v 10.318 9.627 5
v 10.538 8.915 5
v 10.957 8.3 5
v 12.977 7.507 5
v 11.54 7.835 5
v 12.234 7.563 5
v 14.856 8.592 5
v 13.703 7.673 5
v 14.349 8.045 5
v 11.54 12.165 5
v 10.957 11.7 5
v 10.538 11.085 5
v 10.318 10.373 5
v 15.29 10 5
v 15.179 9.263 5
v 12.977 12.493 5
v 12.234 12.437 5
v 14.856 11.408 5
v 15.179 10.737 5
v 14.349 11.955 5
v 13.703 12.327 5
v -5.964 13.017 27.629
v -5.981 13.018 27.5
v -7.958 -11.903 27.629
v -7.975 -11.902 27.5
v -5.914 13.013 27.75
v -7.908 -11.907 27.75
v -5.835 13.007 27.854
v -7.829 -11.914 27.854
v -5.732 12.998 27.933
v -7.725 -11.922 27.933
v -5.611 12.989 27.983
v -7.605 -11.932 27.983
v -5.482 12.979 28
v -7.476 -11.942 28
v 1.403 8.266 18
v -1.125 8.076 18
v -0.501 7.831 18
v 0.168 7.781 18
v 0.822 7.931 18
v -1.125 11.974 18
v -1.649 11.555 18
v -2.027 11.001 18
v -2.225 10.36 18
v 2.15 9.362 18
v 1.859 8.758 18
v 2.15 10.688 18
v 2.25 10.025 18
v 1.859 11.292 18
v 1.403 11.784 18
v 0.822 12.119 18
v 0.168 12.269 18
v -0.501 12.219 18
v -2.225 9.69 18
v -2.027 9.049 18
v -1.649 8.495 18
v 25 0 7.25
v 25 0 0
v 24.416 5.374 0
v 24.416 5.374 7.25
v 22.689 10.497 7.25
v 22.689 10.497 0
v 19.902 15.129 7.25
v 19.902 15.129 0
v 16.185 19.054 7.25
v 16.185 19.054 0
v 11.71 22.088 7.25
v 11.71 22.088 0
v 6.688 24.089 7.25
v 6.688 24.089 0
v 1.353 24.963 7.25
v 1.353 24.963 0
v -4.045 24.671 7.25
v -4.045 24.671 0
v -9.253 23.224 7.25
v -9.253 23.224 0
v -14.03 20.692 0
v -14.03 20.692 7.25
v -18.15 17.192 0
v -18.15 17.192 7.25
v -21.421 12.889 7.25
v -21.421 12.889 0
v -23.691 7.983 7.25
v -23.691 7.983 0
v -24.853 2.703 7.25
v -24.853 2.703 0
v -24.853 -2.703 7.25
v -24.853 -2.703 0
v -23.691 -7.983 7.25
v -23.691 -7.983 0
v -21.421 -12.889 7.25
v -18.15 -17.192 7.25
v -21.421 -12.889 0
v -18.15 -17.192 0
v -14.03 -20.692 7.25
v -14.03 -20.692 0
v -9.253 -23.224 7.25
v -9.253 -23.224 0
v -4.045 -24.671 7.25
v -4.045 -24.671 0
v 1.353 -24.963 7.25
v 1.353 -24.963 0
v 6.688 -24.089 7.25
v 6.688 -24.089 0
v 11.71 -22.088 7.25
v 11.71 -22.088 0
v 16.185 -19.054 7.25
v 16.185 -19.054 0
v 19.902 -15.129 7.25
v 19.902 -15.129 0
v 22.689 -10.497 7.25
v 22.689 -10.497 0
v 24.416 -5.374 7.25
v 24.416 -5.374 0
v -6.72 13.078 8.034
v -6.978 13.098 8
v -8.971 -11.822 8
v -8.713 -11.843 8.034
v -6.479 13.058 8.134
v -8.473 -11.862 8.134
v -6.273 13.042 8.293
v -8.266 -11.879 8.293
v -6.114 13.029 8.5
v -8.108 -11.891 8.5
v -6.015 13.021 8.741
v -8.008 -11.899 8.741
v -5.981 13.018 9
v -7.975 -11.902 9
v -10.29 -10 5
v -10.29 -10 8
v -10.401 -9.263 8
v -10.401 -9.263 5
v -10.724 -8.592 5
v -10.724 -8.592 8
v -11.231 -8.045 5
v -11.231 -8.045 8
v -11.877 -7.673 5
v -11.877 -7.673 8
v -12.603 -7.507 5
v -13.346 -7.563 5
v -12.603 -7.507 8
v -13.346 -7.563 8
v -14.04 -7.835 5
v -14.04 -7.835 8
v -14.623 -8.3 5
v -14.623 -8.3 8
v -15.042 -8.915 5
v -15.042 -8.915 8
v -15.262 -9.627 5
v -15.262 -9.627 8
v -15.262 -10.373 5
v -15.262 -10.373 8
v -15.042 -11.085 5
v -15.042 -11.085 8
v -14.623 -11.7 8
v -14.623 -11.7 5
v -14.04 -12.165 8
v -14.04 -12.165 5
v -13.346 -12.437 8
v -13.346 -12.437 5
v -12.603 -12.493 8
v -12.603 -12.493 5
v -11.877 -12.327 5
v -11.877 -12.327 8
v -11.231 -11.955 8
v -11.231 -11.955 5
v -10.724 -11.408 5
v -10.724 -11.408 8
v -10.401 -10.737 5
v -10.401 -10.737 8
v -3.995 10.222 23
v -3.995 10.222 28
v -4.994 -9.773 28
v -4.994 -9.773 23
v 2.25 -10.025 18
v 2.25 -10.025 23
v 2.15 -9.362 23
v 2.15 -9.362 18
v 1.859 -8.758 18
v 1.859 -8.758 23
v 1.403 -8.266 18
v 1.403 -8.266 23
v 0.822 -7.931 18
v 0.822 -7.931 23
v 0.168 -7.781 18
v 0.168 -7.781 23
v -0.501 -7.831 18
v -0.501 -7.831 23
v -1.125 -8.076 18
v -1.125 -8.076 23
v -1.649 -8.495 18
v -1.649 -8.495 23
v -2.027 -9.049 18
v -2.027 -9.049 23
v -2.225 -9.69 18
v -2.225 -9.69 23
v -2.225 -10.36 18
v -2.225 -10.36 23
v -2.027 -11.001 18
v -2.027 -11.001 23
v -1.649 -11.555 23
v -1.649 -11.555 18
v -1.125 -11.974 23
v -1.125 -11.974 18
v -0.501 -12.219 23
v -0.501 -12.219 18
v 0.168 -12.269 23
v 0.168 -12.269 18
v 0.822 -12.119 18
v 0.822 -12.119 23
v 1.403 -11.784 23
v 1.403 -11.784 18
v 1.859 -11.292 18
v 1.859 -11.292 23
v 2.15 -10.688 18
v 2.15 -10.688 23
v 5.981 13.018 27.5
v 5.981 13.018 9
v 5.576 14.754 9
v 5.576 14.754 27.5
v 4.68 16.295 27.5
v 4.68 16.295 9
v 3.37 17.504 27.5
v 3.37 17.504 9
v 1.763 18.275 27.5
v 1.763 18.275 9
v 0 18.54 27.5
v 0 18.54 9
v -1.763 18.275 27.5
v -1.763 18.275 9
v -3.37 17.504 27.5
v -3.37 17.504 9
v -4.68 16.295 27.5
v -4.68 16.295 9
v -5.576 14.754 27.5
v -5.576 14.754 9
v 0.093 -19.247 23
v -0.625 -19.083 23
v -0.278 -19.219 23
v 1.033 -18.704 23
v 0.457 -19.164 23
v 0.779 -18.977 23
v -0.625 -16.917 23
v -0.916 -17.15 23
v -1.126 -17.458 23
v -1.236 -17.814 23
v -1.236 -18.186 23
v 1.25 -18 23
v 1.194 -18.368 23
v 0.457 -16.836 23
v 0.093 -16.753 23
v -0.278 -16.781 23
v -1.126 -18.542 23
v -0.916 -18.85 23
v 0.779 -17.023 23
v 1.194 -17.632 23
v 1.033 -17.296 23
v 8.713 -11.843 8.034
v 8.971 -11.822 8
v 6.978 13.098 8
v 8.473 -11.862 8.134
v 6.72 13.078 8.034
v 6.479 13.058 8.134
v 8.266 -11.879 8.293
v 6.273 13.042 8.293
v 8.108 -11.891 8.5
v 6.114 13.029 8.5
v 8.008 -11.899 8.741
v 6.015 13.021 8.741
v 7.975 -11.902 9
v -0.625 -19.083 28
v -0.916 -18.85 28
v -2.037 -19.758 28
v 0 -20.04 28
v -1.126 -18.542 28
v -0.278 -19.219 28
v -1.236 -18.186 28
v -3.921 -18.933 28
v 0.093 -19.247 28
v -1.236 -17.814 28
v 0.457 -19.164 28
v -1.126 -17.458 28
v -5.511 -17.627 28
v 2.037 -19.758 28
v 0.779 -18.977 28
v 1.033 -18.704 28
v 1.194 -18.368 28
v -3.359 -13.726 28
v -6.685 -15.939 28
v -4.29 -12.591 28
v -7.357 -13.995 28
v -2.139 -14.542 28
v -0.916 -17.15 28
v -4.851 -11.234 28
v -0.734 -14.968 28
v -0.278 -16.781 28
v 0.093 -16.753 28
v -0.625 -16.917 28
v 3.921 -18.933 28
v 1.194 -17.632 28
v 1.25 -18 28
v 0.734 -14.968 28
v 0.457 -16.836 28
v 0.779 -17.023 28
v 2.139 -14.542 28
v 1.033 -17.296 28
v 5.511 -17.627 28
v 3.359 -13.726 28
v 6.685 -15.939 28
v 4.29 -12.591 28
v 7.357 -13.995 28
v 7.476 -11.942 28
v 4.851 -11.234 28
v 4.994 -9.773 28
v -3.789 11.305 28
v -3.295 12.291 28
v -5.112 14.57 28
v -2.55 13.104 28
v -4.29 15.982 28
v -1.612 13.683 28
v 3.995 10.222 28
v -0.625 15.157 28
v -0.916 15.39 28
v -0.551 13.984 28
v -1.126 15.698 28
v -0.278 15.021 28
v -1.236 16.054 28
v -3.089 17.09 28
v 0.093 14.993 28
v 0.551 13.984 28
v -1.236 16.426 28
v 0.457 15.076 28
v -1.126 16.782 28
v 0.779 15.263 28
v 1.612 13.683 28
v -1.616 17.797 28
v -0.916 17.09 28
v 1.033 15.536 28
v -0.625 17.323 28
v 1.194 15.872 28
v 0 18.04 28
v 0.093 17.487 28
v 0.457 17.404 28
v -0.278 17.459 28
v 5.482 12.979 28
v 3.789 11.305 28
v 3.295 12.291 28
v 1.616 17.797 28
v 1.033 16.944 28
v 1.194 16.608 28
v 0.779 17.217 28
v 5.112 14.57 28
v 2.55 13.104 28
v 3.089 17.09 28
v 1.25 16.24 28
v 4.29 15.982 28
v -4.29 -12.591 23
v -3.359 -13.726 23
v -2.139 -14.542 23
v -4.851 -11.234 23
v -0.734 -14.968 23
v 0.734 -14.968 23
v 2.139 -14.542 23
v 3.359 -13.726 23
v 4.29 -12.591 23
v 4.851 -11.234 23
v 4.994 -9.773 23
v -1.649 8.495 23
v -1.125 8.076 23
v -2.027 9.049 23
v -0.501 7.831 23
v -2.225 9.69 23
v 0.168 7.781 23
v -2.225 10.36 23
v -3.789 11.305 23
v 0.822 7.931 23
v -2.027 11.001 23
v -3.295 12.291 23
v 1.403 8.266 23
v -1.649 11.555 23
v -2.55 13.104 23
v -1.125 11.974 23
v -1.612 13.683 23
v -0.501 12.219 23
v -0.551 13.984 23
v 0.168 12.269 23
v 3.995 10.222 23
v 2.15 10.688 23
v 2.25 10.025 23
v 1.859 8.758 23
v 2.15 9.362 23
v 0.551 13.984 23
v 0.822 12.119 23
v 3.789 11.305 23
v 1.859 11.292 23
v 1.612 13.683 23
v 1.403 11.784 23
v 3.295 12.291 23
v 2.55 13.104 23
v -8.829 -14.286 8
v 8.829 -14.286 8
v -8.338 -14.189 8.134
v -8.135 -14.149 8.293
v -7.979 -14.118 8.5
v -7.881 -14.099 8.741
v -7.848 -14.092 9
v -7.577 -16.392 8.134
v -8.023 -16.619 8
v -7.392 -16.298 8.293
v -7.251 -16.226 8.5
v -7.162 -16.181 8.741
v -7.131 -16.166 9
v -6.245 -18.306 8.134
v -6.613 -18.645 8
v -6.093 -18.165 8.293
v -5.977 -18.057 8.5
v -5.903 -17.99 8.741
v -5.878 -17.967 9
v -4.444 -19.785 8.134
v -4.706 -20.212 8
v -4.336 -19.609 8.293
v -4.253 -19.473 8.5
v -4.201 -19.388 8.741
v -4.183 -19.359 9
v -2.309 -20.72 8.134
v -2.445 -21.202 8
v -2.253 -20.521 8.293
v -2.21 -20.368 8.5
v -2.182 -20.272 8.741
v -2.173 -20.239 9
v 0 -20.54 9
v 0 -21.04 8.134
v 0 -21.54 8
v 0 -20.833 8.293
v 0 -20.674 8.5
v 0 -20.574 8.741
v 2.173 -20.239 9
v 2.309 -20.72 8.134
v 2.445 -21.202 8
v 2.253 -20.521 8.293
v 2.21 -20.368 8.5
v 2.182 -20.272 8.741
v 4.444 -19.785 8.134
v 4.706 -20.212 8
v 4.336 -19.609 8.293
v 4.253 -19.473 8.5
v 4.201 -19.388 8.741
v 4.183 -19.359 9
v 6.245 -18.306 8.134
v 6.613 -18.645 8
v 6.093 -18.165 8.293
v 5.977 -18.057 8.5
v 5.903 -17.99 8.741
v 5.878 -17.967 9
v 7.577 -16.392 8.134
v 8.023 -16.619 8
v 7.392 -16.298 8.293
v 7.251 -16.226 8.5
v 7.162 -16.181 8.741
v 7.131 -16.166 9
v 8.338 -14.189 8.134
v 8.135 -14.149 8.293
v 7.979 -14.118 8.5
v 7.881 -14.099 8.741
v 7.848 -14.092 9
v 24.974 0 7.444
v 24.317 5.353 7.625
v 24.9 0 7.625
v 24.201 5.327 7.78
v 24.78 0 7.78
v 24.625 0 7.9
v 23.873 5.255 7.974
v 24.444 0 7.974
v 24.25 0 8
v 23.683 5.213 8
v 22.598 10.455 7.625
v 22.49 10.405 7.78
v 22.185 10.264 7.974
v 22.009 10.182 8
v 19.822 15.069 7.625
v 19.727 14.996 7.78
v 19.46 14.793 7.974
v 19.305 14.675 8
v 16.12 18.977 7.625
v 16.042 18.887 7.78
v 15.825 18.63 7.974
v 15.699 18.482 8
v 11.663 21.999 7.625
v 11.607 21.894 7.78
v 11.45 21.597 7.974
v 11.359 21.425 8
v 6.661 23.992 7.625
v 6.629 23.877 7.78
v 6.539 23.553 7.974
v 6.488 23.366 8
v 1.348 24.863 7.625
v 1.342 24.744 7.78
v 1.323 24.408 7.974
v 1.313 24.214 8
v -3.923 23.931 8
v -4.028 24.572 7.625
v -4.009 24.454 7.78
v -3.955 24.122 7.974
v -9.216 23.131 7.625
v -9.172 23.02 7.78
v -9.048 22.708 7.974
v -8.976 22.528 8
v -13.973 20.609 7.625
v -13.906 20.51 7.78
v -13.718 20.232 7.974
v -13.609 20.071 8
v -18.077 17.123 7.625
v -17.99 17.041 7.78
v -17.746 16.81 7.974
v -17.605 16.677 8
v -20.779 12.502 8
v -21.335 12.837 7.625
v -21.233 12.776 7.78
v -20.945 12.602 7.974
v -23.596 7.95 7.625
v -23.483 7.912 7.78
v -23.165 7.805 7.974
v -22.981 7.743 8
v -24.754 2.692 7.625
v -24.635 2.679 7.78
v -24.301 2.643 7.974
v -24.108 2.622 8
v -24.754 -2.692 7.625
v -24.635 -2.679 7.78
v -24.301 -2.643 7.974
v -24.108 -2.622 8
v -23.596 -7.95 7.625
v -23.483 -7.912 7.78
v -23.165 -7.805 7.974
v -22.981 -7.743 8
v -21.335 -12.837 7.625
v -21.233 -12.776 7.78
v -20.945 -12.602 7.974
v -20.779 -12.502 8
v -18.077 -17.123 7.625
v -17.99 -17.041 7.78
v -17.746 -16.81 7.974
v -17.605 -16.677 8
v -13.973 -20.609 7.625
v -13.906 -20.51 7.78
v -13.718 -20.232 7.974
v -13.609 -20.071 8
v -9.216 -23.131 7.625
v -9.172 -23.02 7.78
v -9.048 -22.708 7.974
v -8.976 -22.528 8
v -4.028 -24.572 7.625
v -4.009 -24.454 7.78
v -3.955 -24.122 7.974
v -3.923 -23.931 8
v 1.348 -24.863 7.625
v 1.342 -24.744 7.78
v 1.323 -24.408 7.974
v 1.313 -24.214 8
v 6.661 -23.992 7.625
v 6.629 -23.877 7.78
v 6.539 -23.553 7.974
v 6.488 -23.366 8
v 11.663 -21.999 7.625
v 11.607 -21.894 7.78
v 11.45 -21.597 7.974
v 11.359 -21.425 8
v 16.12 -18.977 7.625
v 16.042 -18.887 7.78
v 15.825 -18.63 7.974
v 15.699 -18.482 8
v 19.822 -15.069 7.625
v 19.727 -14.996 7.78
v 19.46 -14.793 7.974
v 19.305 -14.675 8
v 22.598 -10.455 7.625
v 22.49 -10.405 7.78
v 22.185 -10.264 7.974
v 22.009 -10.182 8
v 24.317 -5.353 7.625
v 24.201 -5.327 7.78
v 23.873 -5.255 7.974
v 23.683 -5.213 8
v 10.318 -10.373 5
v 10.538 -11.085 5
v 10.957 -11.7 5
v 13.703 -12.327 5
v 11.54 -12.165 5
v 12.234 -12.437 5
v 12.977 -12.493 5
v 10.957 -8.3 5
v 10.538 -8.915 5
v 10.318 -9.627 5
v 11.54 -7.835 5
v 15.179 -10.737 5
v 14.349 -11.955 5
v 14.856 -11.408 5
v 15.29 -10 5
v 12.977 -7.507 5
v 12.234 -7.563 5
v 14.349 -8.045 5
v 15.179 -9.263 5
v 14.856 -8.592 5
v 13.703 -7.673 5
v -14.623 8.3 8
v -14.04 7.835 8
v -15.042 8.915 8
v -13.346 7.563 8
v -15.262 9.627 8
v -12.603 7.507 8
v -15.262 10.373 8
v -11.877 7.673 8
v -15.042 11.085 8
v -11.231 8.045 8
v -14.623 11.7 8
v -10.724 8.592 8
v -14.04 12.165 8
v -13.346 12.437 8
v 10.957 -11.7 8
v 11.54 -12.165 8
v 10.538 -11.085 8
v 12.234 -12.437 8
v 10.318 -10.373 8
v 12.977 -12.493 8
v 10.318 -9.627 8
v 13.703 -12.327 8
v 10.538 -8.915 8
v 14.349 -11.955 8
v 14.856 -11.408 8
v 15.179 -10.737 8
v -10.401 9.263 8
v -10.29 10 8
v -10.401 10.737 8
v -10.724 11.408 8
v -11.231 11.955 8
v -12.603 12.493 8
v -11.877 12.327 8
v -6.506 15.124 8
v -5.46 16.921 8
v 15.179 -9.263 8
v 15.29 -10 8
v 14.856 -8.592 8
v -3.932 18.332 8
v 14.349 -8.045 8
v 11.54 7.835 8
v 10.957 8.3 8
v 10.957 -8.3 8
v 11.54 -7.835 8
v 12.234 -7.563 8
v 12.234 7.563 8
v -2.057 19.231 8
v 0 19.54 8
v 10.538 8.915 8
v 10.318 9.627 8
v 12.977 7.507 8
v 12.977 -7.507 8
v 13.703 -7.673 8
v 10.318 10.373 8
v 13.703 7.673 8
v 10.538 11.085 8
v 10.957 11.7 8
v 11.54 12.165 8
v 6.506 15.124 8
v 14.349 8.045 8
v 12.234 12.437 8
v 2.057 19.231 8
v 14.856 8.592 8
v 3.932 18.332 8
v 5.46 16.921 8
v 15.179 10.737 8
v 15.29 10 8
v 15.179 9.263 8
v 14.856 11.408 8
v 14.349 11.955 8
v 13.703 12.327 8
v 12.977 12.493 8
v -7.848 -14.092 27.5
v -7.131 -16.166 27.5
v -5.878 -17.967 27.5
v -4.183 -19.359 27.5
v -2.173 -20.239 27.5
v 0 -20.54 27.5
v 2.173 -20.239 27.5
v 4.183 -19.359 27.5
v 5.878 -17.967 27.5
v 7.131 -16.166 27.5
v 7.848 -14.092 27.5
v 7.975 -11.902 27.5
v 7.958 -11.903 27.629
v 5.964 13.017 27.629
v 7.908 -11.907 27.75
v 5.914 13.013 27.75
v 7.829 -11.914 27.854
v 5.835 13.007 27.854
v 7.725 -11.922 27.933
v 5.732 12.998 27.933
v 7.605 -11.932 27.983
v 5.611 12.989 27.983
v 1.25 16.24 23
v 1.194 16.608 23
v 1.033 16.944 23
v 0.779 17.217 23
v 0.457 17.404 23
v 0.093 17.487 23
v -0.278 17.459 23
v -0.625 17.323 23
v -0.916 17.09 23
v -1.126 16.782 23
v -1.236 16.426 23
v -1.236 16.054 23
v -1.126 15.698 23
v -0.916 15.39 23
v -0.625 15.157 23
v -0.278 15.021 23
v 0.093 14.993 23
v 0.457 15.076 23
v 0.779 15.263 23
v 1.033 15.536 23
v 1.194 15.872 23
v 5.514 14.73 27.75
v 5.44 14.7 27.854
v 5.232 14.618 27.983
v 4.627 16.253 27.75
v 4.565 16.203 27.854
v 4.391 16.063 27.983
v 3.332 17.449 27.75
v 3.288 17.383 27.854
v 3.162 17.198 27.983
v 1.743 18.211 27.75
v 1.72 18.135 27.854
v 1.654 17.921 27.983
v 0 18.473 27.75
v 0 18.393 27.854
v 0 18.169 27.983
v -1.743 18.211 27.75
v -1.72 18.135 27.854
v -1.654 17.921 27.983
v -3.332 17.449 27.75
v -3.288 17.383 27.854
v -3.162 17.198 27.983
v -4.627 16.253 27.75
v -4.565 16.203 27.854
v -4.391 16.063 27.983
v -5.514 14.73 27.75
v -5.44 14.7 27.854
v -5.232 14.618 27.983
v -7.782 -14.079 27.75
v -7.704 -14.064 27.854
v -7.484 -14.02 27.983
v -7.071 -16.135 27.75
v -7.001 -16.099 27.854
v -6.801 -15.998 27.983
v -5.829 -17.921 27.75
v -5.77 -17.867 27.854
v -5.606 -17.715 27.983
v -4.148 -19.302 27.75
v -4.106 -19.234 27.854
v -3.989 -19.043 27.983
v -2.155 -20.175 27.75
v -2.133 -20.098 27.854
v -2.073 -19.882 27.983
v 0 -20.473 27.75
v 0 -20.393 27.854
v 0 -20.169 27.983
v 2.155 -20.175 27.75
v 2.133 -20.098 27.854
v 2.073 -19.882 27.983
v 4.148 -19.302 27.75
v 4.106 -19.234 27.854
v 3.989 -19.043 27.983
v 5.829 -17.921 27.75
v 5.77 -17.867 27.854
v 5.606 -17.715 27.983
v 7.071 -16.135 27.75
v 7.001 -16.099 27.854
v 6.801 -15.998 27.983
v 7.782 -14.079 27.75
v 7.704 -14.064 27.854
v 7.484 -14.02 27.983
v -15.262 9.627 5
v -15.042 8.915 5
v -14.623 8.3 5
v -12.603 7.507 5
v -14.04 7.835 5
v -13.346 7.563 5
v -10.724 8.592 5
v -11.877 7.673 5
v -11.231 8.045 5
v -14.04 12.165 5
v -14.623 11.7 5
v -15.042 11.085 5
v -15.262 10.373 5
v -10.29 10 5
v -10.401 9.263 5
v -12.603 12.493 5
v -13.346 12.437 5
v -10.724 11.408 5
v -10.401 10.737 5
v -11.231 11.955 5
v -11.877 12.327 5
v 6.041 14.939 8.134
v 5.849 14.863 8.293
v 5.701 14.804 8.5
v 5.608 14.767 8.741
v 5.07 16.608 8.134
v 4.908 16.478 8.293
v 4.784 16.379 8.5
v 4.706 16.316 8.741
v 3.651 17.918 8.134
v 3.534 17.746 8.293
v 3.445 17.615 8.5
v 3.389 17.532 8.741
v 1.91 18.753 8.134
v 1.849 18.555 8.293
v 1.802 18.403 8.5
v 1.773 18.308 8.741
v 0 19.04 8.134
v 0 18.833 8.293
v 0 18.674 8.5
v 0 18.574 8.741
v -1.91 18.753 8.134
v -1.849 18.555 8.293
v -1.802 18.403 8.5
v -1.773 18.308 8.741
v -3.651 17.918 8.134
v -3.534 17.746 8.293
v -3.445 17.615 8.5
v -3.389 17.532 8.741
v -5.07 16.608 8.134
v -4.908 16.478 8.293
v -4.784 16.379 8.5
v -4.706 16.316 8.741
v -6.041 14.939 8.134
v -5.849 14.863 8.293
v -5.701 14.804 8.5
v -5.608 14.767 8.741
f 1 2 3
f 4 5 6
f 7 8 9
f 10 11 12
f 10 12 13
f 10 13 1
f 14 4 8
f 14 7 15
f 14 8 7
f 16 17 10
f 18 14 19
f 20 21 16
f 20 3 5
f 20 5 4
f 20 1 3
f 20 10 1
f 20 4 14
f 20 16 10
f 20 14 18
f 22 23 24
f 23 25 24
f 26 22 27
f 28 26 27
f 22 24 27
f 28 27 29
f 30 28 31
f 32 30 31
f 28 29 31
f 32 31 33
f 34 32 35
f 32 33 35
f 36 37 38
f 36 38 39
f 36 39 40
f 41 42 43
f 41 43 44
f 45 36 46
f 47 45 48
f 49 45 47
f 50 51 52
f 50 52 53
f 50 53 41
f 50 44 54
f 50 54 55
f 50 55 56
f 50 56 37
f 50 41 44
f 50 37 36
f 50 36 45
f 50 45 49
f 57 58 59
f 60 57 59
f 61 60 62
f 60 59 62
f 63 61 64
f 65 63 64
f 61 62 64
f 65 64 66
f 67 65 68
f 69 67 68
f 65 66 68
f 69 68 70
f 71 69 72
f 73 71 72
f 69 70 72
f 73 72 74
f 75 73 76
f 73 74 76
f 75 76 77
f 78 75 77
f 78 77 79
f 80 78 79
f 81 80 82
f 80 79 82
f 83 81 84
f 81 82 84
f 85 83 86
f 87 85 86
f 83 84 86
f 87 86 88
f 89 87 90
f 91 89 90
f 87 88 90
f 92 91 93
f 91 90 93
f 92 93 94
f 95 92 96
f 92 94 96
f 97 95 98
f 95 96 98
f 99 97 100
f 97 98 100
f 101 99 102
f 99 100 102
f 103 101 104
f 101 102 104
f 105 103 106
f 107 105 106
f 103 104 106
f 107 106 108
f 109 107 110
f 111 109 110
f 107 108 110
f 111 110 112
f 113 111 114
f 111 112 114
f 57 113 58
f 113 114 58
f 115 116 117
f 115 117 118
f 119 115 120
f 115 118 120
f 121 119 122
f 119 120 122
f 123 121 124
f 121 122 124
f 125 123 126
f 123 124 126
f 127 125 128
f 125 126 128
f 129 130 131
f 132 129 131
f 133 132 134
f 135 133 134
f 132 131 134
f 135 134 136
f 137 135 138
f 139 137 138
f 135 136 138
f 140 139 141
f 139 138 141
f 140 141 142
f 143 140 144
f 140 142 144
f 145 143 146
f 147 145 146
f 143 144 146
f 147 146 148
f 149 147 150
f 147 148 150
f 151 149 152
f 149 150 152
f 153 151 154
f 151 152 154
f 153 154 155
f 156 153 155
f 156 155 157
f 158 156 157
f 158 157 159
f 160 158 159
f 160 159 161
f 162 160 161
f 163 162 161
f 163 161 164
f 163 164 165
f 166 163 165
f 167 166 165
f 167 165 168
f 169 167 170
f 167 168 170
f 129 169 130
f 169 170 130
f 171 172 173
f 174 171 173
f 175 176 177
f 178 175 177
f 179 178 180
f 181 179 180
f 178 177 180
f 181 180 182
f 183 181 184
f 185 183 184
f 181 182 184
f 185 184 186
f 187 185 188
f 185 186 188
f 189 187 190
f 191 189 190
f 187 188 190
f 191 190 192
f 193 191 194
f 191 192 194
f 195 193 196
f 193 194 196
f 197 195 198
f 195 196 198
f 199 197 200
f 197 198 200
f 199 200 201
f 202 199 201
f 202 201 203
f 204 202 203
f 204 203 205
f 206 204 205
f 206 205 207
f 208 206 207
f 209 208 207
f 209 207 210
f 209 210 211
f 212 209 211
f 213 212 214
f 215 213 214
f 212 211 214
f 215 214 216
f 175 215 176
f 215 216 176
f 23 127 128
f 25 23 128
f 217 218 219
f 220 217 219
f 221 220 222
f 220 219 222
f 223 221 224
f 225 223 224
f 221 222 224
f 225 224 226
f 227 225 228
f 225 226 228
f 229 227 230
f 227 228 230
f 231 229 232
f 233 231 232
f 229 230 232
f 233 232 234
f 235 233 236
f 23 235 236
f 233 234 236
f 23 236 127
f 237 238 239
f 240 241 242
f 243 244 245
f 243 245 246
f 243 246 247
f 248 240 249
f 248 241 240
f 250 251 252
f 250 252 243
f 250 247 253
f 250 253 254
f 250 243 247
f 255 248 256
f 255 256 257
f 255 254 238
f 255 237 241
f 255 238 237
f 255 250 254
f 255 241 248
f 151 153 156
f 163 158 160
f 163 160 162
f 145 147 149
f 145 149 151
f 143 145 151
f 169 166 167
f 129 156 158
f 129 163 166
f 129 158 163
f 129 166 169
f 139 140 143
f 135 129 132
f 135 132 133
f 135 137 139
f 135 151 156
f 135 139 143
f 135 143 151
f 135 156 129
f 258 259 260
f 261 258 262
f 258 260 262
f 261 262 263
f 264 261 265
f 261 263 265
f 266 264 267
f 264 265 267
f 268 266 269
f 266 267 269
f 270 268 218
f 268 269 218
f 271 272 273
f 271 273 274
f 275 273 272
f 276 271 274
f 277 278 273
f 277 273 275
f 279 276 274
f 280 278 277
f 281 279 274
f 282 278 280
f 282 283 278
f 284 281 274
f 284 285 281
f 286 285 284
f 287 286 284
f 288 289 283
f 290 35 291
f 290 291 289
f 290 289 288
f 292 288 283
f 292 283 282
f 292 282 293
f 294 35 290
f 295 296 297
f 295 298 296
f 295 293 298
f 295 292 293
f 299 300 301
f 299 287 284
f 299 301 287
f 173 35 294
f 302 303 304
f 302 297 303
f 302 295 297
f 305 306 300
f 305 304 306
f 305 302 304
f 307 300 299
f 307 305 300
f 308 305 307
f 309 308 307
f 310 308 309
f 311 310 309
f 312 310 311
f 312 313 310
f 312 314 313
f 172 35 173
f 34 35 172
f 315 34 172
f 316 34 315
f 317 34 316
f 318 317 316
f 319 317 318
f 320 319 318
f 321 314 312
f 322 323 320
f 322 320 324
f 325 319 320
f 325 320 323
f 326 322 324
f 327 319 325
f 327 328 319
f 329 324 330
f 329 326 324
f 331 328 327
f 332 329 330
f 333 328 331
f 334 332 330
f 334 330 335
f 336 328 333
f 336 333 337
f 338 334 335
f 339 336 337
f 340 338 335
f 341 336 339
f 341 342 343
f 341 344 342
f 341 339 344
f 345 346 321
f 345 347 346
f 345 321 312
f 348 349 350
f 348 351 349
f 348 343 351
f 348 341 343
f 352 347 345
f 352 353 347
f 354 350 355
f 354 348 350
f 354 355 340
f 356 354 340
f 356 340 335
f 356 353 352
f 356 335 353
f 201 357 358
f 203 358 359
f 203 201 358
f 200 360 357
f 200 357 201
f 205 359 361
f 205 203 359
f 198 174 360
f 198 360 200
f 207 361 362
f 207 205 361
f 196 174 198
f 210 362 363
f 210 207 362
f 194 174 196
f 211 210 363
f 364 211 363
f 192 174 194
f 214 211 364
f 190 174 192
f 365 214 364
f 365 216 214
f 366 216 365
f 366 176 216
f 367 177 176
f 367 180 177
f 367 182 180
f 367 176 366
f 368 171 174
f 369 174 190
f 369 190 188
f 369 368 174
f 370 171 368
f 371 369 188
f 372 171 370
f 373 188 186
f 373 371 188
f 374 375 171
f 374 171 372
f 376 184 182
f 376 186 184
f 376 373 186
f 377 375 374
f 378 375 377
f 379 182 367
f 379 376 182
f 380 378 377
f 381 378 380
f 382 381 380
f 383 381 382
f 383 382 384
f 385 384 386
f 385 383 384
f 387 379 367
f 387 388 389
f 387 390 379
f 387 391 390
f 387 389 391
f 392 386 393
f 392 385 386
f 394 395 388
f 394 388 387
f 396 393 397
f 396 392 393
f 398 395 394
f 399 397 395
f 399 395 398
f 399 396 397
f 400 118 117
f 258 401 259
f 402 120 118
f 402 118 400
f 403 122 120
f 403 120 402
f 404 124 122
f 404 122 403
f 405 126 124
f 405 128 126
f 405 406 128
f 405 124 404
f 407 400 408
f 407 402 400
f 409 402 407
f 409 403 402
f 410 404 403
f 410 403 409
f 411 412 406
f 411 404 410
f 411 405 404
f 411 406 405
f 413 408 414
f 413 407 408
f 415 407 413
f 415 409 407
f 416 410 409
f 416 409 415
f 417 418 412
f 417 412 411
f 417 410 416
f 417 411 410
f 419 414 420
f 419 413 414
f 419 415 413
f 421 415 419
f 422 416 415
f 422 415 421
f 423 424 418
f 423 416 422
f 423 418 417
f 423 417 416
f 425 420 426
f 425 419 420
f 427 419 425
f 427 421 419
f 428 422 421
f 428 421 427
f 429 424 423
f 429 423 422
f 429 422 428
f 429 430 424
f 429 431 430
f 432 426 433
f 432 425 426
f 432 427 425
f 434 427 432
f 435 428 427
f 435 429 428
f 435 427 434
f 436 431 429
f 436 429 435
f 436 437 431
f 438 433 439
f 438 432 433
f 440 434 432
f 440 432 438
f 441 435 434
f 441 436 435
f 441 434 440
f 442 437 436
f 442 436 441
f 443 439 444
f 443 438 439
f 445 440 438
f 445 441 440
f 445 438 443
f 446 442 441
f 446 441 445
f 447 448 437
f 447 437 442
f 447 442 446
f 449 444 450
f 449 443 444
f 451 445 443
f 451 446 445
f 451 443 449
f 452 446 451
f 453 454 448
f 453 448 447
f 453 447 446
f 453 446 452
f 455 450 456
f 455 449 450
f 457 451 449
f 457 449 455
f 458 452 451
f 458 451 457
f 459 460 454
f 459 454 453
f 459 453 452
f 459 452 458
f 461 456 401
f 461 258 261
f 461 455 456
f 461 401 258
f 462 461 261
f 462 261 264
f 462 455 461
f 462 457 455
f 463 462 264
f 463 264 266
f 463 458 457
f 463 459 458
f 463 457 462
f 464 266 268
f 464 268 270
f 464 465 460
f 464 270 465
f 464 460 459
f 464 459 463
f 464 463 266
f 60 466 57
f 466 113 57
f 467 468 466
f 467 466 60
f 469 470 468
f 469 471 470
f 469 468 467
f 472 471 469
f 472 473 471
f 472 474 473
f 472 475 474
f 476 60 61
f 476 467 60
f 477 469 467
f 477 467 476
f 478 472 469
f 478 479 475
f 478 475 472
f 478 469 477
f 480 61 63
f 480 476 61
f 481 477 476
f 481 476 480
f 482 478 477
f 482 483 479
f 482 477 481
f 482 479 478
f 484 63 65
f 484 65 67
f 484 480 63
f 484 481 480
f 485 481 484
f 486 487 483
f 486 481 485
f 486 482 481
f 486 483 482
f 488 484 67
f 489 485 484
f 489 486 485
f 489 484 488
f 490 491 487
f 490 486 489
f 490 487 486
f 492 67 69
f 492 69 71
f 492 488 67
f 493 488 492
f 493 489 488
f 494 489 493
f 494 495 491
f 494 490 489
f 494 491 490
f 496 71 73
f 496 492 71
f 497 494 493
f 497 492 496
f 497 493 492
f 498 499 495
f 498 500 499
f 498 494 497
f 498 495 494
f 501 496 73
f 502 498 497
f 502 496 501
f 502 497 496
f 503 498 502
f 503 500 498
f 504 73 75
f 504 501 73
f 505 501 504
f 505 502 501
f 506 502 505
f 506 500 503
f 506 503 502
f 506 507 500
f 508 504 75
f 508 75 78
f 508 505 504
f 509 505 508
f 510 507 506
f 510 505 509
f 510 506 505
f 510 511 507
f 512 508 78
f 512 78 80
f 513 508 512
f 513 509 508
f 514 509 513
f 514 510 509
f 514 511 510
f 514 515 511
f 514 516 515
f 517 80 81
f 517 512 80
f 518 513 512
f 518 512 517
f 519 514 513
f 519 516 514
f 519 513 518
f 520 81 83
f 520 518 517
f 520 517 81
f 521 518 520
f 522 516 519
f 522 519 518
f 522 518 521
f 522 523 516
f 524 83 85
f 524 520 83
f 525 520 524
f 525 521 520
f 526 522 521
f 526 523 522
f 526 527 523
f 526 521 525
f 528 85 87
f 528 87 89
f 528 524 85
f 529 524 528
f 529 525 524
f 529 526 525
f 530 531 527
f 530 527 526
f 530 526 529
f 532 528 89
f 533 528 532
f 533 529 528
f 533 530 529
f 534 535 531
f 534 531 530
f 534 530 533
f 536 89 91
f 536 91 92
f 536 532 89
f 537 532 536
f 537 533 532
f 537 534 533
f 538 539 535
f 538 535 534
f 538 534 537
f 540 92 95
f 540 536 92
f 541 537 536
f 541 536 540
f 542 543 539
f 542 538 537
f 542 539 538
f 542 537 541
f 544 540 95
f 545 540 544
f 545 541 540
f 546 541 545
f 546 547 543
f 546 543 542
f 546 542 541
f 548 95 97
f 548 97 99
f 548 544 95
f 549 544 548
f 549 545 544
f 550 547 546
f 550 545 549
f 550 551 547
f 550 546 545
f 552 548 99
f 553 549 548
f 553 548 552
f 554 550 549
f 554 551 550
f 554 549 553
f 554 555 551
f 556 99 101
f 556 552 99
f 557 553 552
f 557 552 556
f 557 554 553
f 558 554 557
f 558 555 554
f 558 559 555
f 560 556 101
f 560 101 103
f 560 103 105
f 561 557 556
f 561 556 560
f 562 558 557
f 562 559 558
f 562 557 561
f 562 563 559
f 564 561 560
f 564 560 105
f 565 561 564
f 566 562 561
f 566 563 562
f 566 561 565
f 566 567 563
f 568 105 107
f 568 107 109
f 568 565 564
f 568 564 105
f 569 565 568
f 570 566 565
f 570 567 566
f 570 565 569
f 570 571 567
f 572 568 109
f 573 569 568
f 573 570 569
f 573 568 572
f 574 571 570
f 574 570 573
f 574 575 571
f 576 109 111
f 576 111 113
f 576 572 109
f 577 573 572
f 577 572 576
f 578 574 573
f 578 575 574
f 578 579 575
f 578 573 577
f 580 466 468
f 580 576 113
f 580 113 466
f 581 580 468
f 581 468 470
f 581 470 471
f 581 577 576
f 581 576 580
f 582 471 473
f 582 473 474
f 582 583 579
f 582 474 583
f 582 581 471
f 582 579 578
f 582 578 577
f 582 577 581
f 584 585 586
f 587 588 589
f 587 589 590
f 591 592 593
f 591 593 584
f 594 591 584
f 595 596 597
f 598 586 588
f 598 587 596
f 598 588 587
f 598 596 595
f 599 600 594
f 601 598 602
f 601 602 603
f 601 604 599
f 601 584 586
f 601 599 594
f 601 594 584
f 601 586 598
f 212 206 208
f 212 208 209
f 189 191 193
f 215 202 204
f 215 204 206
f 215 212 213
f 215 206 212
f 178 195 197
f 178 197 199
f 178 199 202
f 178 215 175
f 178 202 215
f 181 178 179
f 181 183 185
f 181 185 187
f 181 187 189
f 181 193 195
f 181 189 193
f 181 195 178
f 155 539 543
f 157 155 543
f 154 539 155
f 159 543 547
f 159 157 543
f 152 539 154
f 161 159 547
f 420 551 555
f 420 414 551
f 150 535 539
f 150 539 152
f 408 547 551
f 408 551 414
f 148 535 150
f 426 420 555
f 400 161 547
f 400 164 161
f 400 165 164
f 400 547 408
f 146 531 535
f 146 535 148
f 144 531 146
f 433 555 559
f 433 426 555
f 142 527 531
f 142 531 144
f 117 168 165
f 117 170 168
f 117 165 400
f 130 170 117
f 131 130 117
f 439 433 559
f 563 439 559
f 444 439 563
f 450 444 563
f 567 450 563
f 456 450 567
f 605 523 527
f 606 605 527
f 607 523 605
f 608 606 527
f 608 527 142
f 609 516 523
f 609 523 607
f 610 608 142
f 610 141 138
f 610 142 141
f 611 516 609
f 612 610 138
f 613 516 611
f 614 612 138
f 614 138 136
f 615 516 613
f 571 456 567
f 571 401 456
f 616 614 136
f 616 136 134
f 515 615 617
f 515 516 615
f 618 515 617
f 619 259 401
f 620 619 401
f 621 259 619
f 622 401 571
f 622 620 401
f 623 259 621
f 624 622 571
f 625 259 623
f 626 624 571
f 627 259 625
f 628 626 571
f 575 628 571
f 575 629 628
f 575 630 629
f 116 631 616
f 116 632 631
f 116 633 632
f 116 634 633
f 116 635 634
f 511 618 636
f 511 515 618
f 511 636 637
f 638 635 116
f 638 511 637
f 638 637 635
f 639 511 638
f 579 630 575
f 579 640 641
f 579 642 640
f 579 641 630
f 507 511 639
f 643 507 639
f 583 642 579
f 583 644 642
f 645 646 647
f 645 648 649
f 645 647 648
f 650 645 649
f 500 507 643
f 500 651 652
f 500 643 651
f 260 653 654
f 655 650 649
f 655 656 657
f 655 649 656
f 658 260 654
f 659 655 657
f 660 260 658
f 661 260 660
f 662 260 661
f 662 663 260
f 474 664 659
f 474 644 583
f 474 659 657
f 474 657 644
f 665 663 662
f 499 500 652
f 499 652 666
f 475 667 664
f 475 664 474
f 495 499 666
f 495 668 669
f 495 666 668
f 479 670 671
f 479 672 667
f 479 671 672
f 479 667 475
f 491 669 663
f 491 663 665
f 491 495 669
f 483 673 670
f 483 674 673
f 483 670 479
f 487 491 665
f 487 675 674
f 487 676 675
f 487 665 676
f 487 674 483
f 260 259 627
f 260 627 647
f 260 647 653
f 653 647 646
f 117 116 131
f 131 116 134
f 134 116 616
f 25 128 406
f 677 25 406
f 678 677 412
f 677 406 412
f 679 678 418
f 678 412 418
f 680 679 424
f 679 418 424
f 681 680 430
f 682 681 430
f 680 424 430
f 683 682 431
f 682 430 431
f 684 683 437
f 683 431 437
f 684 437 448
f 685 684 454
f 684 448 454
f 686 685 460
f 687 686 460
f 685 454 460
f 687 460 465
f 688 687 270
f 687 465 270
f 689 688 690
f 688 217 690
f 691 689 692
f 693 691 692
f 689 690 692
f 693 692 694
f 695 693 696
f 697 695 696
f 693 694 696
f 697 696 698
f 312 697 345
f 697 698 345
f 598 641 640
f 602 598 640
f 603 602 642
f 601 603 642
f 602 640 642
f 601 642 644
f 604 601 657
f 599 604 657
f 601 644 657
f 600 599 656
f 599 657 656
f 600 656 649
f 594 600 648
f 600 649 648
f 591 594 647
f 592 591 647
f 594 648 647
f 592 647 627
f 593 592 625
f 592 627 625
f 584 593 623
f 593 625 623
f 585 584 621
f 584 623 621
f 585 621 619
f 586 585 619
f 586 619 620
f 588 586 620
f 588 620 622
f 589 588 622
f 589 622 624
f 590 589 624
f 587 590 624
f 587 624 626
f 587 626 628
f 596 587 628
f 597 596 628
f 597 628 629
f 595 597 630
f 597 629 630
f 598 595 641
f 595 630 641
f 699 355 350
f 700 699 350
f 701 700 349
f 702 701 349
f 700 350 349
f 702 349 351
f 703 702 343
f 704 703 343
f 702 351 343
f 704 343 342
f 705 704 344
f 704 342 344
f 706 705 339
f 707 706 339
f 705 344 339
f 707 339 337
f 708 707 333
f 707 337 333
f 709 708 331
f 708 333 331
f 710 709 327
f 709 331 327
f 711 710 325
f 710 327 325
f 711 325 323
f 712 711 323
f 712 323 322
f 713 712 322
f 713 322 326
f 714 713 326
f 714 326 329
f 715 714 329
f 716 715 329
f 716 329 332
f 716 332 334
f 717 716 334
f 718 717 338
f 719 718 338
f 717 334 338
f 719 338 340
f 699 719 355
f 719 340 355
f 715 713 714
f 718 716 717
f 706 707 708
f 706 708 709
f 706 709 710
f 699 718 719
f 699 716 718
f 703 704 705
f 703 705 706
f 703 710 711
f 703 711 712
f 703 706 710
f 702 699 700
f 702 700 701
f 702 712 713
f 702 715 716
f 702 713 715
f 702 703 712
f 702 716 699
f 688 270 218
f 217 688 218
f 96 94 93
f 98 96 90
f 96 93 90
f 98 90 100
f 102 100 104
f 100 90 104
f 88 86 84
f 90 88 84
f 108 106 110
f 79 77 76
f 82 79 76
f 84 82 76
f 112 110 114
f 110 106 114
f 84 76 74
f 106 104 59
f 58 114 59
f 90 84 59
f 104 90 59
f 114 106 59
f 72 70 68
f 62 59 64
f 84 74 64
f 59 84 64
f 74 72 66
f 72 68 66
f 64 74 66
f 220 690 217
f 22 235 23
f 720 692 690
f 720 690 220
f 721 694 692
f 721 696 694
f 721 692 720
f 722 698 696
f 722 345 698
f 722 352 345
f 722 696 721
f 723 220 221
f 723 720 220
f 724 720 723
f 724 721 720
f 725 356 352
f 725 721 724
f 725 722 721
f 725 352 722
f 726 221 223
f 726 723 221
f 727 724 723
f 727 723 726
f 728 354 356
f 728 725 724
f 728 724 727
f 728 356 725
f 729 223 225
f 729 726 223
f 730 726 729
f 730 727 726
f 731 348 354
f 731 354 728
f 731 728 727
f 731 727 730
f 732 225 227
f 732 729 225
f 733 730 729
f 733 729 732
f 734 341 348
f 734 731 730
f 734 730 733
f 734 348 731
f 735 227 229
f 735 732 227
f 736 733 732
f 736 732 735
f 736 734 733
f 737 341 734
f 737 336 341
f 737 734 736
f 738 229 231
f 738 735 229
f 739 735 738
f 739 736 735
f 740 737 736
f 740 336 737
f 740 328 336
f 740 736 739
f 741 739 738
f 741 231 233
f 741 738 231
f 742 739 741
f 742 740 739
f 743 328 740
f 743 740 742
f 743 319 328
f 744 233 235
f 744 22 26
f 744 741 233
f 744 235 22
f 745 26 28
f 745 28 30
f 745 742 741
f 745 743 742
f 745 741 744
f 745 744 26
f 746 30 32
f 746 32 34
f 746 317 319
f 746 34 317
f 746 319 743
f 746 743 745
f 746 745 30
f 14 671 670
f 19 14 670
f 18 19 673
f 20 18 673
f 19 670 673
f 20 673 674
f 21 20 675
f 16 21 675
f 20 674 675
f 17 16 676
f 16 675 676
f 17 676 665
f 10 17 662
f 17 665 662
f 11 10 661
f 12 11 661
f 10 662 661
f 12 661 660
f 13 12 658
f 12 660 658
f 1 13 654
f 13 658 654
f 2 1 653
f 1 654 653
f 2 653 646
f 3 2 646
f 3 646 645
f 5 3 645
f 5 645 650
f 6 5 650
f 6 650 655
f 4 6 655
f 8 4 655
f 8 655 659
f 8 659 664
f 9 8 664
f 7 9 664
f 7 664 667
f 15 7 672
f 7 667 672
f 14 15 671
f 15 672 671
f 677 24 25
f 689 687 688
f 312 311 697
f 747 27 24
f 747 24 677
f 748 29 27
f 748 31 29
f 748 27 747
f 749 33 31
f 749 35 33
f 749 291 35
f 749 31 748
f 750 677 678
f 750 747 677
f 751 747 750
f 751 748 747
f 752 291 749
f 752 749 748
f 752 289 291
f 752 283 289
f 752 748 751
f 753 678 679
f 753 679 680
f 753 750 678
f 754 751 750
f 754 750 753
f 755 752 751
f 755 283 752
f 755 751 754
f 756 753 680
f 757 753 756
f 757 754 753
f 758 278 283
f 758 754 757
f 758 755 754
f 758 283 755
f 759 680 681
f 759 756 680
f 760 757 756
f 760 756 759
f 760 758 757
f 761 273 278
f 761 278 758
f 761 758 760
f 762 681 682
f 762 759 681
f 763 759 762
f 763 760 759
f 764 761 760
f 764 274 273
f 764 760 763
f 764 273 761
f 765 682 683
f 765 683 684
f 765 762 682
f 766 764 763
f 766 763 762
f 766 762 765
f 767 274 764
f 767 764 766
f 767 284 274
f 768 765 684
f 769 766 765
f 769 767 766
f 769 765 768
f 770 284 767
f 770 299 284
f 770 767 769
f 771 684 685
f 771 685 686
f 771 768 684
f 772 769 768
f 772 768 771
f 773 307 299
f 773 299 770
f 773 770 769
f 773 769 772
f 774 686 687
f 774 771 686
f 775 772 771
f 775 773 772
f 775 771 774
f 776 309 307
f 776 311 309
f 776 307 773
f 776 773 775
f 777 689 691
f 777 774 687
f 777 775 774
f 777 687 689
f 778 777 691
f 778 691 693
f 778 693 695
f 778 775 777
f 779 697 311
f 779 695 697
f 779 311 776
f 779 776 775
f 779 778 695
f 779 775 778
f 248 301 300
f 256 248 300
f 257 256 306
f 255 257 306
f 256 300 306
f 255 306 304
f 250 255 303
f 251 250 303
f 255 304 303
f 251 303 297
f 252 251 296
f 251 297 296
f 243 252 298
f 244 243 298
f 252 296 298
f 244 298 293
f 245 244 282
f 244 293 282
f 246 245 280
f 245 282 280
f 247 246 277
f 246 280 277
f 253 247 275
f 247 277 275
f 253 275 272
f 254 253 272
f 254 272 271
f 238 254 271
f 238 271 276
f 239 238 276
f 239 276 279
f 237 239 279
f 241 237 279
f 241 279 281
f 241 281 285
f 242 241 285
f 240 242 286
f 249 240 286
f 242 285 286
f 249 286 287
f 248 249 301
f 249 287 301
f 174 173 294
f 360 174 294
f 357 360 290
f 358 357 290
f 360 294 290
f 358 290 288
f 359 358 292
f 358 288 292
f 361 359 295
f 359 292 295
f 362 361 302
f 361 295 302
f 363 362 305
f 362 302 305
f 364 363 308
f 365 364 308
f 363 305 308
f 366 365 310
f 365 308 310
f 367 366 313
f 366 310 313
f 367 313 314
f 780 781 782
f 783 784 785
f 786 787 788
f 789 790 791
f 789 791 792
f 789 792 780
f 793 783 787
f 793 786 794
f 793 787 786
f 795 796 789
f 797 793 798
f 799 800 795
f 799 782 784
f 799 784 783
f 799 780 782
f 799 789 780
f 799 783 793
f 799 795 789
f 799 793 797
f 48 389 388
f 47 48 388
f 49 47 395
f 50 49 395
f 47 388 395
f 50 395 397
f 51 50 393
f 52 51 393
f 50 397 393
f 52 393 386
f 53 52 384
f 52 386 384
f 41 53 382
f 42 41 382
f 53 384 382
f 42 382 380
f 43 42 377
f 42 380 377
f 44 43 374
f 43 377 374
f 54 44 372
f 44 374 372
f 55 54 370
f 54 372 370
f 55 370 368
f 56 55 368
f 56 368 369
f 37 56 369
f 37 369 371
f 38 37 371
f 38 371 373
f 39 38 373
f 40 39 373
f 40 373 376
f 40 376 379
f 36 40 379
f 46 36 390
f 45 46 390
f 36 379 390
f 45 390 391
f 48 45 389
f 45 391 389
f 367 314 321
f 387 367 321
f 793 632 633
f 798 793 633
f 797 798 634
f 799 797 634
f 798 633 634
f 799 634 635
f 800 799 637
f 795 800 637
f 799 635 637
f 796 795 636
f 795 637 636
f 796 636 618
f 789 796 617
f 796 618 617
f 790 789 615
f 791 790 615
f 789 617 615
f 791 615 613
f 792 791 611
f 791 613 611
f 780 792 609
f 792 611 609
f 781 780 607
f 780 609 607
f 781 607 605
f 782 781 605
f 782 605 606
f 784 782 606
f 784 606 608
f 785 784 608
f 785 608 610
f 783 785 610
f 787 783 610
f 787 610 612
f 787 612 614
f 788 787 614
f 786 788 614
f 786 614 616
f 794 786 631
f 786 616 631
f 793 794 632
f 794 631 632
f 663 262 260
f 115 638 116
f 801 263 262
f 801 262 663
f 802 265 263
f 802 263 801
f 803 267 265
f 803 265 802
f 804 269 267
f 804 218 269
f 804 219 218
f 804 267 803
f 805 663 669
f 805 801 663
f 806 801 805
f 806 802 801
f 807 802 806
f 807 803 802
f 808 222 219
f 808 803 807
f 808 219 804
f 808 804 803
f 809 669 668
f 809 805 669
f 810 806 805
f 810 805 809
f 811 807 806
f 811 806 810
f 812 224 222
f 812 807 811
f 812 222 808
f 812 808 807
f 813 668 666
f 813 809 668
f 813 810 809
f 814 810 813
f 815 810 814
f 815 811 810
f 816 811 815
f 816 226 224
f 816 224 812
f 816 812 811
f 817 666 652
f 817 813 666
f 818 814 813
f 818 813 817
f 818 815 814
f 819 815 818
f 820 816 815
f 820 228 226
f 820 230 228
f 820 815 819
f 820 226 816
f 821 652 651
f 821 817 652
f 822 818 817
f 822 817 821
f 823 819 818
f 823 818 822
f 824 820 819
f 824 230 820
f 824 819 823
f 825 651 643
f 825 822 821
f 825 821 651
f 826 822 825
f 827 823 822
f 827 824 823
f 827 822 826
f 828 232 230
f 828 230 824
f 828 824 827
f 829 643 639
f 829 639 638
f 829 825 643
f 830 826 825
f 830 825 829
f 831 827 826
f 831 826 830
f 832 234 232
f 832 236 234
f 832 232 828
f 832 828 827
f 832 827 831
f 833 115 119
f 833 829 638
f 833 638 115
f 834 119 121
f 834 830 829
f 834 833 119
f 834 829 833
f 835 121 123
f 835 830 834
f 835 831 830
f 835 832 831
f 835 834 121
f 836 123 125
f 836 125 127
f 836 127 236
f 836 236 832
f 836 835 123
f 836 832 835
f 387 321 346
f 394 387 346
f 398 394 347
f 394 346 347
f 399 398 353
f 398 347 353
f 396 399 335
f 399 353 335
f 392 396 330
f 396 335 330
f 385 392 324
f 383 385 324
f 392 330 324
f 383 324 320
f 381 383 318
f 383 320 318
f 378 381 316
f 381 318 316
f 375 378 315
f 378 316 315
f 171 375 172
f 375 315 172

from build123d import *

# Parameters (mm, degrees)
SKETCH_R        = 25
PAD_DEPTH       = 8
PAD001_DEPTH    = 20
SKETCH002_R     = 2.5
POCKET_DEPTH    = 3
POCKET001_DEPTH = 5
SKETCH004_R     = 2.25
POCKET002_DEPTH = 5
SKETCH005_R     = 1.25
POCKET003_DEPTH = 5
FILLET_R        = 0.75
FILLET001_R     = 1
FILLET002_R     = 0.5


with BuildPart() as part:
    # Sketch → Pad (new body)
    with BuildSketch(Plane.XY):
        Circle(SKETCH_R)
    extrude(amount=PAD_DEPTH)

    # Sketch001 (on Face3 of Pad) → Pad001 (join)
    with BuildSketch(Plane.XY.offset(8)):
        with BuildLine():
            ThreePointArc((5.980892, 13.018408), (0, 18.539936), (-5.980892, 13.018408))
            Line((-5.980892, 13.018408), (-7.974522, -11.901974))
            ThreePointArc((-7.974522, -11.901974), (0, -20.539936), (7.974522, -11.901974))
            Line((7.974522, -11.901974), (5.980892, 13.018408))
        make_face()
    extrude(amount=PAD001_DEPTH)

    # Sketch002 (on Face3 of Pad001) → Pocket (cut)
    with BuildSketch(Plane.XY.offset(8)):
        with Locations((12.79, 10)):
            Circle(SKETCH002_R)
        with Locations((12.79, -10)):
            Circle(SKETCH002_R)
        with Locations((-12.79, -10)):
            Circle(SKETCH002_R)
        with Locations((-12.79, 10)):
            Circle(SKETCH002_R)
    extrude(amount=-POCKET_DEPTH, mode=Mode.SUBTRACT)

    # Sketch003 (on Face14 of Pocket) → Pocket001 (cut)
    with BuildSketch(Plane.XY.offset(28)):
        with BuildLine():
            ThreePointArc((3.995019, 10.222031), (0, 14.02248), (-3.995019, 10.222031))
            Line((-3.995019, 10.222031), (-4.993774, -9.77304))
            ThreePointArc((-4.993774, -9.77304), (0, -15.02248), (4.993774, -9.77304))
            Line((4.993774, -9.77304), (3.995019, 10.222031))
        make_face()
    extrude(amount=-POCKET001_DEPTH, mode=Mode.SUBTRACT)

    # Sketch004 (on Face21 of Pocket001) → Pocket002 (cut)
    with BuildSketch(Plane.XY.offset(23)):
        with Locations((0, 10.025)):
            Circle(SKETCH004_R)
        with Locations((0, -10.025)):
            Circle(SKETCH004_R)
    extrude(amount=-POCKET002_DEPTH, mode=Mode.SUBTRACT)

    # Sketch005 (on Face14 of Pocket002) → Pocket003 (cut)
    with BuildSketch(Plane.XY.offset(28)):
        with Locations((0, 16.24)):
            Circle(SKETCH005_R)
        with Locations((0, -18)):
            Circle(SKETCH005_R)
    extrude(amount=-POCKET003_DEPTH, mode=Mode.SUBTRACT)

    # Fillet
    fillet_edges = [part.edges().sort_by_distance(p)[0] for p in [
        (-25, 0, 8),
    ]]
    fillet(fillet_edges, radius=FILLET_R)

    # Fillet001
    fillet001_edges = [part.edges().sort_by_distance(p)[0] for p in [
        (0, -20.539936, 8),
    ]]
    fillet(fillet001_edges, radius=FILLET001_R)

    # Fillet002
    fillet002_edges = [part.edges().sort_by_distance(p)[0] for p in [
        (6.977707, 0.558217, 28),
    ]]
    fillet(fillet002_edges, radius=FILLET002_R)


solid = part.part
